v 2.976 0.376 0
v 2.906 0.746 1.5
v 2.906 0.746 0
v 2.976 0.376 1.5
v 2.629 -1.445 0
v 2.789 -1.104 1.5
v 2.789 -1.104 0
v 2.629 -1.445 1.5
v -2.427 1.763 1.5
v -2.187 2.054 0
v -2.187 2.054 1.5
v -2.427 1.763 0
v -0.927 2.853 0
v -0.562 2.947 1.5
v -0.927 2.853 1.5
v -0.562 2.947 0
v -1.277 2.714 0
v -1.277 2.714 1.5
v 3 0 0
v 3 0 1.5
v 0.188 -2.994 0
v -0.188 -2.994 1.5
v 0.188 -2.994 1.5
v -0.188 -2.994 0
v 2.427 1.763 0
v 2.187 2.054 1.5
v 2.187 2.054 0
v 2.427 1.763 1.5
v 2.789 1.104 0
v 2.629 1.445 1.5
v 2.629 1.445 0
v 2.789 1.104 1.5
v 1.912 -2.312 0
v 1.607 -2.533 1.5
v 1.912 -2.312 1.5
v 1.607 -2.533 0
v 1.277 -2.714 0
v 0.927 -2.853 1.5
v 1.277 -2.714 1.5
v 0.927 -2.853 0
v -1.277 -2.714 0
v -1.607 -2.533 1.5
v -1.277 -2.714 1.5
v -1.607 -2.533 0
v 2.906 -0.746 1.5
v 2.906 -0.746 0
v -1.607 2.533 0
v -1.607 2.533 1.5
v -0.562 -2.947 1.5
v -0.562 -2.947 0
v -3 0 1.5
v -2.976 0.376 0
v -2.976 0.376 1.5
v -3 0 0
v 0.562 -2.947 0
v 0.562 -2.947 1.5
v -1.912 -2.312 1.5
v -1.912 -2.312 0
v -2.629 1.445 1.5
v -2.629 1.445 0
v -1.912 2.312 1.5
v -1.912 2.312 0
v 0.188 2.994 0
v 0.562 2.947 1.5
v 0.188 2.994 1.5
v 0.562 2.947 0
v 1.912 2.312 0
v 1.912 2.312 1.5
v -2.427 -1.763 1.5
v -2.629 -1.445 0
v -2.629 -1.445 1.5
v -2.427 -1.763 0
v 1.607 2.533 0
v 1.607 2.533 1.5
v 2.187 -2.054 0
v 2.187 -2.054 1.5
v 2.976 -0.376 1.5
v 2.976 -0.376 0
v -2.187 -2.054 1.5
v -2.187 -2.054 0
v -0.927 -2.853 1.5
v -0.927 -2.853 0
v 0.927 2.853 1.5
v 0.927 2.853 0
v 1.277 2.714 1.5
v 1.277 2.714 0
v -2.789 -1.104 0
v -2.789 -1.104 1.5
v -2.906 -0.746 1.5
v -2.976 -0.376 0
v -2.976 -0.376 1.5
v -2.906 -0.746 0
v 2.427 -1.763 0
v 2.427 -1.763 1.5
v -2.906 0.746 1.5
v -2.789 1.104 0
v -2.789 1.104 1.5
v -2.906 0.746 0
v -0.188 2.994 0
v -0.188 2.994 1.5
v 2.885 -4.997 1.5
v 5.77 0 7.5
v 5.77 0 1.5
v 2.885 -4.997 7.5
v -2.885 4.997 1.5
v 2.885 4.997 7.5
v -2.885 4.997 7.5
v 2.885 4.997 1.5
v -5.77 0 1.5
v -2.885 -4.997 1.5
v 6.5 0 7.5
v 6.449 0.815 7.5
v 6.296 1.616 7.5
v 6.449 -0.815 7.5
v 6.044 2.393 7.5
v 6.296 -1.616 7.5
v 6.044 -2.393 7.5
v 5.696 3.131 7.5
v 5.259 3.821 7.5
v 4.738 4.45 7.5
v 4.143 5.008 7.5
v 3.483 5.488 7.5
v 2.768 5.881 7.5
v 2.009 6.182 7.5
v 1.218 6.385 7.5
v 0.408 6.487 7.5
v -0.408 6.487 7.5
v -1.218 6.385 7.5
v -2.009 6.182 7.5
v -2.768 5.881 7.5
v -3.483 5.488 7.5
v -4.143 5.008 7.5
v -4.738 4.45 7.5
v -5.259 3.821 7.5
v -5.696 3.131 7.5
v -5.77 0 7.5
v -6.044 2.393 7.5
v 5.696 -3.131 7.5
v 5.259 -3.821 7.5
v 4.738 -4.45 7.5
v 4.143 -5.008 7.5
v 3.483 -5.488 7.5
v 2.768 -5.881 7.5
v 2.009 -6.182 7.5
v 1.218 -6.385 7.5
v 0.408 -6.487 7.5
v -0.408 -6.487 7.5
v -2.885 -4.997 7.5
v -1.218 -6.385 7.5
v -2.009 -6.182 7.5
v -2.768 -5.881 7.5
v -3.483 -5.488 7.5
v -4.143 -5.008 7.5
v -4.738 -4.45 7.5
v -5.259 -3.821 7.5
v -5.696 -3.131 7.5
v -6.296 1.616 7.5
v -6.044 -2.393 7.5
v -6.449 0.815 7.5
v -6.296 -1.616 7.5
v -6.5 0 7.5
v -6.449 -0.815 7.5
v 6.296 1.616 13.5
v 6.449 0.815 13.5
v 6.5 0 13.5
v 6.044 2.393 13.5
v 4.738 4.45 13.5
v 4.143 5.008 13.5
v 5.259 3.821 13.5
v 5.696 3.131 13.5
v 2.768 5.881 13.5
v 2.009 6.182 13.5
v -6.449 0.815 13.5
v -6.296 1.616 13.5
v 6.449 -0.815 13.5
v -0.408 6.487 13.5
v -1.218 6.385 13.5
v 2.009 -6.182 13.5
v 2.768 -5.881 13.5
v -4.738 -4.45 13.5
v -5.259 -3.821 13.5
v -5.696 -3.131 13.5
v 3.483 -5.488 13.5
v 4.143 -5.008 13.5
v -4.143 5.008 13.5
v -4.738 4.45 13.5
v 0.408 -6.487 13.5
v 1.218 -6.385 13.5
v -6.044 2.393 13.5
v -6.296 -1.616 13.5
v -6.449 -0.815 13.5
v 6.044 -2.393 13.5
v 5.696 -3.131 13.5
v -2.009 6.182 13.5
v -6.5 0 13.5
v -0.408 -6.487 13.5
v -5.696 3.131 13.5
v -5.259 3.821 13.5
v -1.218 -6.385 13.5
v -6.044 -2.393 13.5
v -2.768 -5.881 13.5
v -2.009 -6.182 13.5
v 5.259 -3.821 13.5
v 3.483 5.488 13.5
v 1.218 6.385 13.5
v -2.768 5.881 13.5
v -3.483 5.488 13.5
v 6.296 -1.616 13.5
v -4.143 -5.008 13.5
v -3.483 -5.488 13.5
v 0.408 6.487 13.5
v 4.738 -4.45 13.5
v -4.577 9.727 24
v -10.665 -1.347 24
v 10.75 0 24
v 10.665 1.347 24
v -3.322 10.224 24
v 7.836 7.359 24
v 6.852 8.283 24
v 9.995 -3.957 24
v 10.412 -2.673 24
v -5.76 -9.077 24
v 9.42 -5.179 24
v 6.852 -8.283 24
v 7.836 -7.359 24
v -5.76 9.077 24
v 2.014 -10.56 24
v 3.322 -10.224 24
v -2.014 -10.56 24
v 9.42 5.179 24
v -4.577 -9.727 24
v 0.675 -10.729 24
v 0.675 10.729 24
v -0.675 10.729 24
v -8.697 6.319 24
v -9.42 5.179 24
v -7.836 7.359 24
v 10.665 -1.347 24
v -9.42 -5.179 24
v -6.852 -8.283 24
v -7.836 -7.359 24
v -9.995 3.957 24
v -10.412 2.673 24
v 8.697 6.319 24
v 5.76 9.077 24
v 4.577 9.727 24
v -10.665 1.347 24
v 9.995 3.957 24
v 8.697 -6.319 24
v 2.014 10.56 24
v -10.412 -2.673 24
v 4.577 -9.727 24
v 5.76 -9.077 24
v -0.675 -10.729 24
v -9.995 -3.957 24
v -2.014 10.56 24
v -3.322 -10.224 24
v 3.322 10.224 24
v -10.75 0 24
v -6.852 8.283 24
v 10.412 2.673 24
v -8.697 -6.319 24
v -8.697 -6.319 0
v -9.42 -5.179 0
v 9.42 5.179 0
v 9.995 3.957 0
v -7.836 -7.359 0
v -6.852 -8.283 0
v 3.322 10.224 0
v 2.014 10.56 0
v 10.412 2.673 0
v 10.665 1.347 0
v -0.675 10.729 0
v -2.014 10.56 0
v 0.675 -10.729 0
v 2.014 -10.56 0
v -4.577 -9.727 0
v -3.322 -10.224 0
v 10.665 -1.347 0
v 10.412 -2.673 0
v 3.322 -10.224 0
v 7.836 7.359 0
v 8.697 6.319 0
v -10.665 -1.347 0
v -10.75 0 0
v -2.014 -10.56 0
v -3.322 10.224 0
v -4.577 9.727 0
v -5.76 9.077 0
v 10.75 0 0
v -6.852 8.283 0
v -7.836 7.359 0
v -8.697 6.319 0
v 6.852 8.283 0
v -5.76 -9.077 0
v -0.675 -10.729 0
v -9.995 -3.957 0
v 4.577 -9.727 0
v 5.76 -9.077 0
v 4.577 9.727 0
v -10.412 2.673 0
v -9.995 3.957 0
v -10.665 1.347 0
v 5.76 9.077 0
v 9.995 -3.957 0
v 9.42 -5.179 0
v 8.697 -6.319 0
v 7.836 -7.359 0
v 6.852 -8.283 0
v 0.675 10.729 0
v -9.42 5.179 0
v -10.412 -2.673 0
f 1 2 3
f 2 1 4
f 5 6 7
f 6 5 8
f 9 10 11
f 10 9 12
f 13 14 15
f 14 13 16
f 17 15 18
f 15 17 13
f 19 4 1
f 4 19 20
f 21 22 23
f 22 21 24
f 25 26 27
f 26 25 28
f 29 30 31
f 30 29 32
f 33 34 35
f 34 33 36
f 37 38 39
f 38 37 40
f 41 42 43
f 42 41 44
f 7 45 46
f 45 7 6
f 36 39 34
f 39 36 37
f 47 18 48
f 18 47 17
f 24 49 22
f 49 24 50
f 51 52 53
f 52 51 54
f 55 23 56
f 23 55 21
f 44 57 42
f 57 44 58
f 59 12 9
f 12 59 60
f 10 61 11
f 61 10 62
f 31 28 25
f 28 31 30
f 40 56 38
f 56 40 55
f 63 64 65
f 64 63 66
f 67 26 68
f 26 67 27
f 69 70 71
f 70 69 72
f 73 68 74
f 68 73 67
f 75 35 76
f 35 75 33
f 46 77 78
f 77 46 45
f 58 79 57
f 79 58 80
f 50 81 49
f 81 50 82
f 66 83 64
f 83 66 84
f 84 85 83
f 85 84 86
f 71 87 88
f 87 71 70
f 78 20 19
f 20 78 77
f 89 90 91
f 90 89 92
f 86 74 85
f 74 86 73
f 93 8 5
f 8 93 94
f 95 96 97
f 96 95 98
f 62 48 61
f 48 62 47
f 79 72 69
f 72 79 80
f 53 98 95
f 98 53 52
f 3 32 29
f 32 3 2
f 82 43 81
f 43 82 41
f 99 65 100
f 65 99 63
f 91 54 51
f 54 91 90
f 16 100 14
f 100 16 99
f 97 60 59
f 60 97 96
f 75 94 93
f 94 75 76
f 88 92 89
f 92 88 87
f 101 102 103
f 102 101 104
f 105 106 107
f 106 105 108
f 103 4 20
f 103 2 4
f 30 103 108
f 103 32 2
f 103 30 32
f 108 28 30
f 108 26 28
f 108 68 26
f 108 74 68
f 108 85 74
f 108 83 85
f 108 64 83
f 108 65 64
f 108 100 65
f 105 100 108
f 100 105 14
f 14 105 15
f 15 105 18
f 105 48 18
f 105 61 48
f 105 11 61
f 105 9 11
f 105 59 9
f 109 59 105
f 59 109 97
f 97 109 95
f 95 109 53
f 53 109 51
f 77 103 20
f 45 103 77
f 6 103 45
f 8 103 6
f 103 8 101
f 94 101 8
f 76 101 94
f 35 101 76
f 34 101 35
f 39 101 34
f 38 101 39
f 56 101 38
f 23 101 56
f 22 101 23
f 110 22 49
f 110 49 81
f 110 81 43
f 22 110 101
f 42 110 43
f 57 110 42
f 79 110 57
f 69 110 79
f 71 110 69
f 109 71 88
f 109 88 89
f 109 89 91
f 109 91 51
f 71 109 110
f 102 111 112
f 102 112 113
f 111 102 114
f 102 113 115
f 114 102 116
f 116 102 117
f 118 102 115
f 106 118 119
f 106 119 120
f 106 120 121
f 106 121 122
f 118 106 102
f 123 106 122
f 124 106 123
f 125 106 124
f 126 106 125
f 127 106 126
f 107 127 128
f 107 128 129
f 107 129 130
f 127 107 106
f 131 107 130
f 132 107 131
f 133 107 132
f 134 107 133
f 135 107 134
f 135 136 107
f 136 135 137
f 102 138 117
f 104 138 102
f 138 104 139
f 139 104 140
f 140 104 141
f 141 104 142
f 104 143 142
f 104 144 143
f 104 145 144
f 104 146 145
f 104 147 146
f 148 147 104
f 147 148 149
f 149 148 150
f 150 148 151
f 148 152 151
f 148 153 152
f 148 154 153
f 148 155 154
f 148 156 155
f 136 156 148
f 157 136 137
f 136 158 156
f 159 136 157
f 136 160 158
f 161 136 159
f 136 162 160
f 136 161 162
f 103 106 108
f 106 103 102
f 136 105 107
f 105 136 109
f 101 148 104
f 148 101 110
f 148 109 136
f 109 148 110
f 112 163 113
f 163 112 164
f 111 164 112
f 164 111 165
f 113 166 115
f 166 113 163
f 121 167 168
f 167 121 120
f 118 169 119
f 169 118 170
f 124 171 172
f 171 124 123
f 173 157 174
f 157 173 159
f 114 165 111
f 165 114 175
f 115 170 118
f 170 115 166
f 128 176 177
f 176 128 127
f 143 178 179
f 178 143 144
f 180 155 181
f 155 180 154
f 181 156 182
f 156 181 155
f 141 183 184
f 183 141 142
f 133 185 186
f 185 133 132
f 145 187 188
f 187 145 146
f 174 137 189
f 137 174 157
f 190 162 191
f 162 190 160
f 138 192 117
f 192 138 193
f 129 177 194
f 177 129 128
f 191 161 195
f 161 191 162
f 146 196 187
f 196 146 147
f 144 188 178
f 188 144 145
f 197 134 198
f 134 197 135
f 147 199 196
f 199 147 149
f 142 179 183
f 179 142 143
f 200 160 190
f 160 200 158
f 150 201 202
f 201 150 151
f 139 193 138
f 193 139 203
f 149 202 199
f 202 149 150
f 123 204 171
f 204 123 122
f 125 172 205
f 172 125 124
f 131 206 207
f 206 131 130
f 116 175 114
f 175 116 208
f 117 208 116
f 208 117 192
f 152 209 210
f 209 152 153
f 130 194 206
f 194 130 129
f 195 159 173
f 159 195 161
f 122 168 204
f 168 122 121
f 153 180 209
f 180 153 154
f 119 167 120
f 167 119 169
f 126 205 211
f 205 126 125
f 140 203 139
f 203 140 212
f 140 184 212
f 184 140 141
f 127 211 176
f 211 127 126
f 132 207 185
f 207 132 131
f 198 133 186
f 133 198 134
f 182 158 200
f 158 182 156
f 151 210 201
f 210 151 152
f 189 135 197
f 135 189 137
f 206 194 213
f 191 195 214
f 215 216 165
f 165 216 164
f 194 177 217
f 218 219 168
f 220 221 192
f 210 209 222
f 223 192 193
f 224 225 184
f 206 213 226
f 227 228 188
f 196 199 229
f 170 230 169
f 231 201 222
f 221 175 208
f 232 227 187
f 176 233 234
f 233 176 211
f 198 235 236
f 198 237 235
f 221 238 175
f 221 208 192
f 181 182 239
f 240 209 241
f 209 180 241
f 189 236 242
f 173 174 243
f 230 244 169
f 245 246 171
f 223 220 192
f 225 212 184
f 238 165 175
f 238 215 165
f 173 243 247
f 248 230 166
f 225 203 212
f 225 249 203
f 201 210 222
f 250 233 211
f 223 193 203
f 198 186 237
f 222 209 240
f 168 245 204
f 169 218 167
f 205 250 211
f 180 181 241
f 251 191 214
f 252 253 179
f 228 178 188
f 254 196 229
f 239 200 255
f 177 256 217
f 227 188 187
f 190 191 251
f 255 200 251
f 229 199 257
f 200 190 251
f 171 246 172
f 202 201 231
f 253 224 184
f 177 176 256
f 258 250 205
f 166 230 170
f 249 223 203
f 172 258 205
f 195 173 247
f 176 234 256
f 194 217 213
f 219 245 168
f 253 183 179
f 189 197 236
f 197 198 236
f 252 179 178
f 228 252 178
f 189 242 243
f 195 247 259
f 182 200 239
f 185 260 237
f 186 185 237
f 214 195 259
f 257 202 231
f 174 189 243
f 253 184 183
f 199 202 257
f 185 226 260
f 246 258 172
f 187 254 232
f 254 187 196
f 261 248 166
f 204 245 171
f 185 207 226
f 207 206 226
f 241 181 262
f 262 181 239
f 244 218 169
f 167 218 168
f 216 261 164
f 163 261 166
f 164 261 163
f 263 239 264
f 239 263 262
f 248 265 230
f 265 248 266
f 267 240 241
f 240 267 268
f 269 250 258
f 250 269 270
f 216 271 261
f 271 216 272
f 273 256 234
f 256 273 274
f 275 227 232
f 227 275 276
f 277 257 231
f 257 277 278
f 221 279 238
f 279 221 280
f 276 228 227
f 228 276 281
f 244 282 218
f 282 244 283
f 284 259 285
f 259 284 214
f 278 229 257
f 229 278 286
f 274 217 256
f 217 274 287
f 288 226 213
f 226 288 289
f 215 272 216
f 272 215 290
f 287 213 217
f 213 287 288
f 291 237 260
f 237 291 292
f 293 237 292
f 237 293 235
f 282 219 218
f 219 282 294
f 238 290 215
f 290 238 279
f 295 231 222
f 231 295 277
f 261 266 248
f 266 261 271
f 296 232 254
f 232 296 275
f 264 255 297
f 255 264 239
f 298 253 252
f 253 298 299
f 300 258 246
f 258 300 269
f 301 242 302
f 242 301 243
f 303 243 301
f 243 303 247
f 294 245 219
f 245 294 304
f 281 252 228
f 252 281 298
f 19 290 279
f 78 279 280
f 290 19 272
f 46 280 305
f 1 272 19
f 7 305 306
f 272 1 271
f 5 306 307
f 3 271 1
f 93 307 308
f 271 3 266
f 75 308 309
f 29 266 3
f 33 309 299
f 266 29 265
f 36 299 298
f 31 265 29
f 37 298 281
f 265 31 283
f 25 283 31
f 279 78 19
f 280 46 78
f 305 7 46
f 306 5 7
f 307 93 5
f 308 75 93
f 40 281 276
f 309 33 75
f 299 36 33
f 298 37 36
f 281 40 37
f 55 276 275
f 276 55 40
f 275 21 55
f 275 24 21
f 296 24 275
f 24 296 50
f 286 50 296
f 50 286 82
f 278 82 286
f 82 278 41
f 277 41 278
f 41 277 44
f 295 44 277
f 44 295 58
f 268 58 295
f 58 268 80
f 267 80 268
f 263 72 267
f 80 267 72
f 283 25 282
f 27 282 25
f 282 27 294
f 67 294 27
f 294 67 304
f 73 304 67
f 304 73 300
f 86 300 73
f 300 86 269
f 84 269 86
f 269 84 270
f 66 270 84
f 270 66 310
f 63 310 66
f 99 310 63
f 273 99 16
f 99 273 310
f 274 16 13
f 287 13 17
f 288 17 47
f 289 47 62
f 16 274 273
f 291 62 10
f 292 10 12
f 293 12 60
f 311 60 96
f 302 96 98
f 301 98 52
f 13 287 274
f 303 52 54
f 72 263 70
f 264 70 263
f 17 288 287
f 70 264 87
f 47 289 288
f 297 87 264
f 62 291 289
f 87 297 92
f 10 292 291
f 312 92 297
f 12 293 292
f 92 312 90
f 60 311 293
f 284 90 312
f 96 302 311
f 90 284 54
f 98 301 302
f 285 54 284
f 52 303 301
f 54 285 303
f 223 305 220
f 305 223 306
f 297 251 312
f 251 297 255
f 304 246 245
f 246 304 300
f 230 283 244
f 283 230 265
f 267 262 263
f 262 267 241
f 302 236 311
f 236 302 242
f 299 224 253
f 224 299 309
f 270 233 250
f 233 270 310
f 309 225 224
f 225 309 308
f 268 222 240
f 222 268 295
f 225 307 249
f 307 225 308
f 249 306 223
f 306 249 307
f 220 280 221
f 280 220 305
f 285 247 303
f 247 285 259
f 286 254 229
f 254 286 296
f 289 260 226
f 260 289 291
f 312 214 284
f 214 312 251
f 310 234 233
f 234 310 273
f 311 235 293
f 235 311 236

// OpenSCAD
$fn = 50;


difference() {
	union() {
		cylinder(h = 24, r = 10.7500000000);
	}
	union() {
		translate(v = [0, 0, 0]) {
			rotate(a = [0, 0, 0]) {
				difference() {
					union() {
						translate(v = [0, 0, -50.0000000000]) {
							cylinder(h = 100, r = 3.0000000000);
						}
					}
					union();
				}
			}
		}
		translate(v = [0, 0, 1.5000000000]) {
			rotate(a = [0, 0, 0]) {
				difference() {
					union() {
						linear_extrude(height = 6) {
							polygon(points = [[5.7700000000, 0.0000000000], [2.8850000000, 4.9969665798], [-2.8850000000, 4.9969665798], [-5.7700000000, 0.0000000000], [-2.8850000000, -4.9969665798], [2.8850000000, -4.9969665798]]);
						}
					}
					union();
				}
			}
		}
		translate(v = [0, 0, 7.5000000000]) {
			cylinder(h = 6, r = 6.5000000000);
		}
		translate(v = [0, 0, 13.5000000000]) {
			cylinder(h = 10.5000000000, r1 = 6.5000000000, r2 = 10.7500000000);
		}
	}
}
